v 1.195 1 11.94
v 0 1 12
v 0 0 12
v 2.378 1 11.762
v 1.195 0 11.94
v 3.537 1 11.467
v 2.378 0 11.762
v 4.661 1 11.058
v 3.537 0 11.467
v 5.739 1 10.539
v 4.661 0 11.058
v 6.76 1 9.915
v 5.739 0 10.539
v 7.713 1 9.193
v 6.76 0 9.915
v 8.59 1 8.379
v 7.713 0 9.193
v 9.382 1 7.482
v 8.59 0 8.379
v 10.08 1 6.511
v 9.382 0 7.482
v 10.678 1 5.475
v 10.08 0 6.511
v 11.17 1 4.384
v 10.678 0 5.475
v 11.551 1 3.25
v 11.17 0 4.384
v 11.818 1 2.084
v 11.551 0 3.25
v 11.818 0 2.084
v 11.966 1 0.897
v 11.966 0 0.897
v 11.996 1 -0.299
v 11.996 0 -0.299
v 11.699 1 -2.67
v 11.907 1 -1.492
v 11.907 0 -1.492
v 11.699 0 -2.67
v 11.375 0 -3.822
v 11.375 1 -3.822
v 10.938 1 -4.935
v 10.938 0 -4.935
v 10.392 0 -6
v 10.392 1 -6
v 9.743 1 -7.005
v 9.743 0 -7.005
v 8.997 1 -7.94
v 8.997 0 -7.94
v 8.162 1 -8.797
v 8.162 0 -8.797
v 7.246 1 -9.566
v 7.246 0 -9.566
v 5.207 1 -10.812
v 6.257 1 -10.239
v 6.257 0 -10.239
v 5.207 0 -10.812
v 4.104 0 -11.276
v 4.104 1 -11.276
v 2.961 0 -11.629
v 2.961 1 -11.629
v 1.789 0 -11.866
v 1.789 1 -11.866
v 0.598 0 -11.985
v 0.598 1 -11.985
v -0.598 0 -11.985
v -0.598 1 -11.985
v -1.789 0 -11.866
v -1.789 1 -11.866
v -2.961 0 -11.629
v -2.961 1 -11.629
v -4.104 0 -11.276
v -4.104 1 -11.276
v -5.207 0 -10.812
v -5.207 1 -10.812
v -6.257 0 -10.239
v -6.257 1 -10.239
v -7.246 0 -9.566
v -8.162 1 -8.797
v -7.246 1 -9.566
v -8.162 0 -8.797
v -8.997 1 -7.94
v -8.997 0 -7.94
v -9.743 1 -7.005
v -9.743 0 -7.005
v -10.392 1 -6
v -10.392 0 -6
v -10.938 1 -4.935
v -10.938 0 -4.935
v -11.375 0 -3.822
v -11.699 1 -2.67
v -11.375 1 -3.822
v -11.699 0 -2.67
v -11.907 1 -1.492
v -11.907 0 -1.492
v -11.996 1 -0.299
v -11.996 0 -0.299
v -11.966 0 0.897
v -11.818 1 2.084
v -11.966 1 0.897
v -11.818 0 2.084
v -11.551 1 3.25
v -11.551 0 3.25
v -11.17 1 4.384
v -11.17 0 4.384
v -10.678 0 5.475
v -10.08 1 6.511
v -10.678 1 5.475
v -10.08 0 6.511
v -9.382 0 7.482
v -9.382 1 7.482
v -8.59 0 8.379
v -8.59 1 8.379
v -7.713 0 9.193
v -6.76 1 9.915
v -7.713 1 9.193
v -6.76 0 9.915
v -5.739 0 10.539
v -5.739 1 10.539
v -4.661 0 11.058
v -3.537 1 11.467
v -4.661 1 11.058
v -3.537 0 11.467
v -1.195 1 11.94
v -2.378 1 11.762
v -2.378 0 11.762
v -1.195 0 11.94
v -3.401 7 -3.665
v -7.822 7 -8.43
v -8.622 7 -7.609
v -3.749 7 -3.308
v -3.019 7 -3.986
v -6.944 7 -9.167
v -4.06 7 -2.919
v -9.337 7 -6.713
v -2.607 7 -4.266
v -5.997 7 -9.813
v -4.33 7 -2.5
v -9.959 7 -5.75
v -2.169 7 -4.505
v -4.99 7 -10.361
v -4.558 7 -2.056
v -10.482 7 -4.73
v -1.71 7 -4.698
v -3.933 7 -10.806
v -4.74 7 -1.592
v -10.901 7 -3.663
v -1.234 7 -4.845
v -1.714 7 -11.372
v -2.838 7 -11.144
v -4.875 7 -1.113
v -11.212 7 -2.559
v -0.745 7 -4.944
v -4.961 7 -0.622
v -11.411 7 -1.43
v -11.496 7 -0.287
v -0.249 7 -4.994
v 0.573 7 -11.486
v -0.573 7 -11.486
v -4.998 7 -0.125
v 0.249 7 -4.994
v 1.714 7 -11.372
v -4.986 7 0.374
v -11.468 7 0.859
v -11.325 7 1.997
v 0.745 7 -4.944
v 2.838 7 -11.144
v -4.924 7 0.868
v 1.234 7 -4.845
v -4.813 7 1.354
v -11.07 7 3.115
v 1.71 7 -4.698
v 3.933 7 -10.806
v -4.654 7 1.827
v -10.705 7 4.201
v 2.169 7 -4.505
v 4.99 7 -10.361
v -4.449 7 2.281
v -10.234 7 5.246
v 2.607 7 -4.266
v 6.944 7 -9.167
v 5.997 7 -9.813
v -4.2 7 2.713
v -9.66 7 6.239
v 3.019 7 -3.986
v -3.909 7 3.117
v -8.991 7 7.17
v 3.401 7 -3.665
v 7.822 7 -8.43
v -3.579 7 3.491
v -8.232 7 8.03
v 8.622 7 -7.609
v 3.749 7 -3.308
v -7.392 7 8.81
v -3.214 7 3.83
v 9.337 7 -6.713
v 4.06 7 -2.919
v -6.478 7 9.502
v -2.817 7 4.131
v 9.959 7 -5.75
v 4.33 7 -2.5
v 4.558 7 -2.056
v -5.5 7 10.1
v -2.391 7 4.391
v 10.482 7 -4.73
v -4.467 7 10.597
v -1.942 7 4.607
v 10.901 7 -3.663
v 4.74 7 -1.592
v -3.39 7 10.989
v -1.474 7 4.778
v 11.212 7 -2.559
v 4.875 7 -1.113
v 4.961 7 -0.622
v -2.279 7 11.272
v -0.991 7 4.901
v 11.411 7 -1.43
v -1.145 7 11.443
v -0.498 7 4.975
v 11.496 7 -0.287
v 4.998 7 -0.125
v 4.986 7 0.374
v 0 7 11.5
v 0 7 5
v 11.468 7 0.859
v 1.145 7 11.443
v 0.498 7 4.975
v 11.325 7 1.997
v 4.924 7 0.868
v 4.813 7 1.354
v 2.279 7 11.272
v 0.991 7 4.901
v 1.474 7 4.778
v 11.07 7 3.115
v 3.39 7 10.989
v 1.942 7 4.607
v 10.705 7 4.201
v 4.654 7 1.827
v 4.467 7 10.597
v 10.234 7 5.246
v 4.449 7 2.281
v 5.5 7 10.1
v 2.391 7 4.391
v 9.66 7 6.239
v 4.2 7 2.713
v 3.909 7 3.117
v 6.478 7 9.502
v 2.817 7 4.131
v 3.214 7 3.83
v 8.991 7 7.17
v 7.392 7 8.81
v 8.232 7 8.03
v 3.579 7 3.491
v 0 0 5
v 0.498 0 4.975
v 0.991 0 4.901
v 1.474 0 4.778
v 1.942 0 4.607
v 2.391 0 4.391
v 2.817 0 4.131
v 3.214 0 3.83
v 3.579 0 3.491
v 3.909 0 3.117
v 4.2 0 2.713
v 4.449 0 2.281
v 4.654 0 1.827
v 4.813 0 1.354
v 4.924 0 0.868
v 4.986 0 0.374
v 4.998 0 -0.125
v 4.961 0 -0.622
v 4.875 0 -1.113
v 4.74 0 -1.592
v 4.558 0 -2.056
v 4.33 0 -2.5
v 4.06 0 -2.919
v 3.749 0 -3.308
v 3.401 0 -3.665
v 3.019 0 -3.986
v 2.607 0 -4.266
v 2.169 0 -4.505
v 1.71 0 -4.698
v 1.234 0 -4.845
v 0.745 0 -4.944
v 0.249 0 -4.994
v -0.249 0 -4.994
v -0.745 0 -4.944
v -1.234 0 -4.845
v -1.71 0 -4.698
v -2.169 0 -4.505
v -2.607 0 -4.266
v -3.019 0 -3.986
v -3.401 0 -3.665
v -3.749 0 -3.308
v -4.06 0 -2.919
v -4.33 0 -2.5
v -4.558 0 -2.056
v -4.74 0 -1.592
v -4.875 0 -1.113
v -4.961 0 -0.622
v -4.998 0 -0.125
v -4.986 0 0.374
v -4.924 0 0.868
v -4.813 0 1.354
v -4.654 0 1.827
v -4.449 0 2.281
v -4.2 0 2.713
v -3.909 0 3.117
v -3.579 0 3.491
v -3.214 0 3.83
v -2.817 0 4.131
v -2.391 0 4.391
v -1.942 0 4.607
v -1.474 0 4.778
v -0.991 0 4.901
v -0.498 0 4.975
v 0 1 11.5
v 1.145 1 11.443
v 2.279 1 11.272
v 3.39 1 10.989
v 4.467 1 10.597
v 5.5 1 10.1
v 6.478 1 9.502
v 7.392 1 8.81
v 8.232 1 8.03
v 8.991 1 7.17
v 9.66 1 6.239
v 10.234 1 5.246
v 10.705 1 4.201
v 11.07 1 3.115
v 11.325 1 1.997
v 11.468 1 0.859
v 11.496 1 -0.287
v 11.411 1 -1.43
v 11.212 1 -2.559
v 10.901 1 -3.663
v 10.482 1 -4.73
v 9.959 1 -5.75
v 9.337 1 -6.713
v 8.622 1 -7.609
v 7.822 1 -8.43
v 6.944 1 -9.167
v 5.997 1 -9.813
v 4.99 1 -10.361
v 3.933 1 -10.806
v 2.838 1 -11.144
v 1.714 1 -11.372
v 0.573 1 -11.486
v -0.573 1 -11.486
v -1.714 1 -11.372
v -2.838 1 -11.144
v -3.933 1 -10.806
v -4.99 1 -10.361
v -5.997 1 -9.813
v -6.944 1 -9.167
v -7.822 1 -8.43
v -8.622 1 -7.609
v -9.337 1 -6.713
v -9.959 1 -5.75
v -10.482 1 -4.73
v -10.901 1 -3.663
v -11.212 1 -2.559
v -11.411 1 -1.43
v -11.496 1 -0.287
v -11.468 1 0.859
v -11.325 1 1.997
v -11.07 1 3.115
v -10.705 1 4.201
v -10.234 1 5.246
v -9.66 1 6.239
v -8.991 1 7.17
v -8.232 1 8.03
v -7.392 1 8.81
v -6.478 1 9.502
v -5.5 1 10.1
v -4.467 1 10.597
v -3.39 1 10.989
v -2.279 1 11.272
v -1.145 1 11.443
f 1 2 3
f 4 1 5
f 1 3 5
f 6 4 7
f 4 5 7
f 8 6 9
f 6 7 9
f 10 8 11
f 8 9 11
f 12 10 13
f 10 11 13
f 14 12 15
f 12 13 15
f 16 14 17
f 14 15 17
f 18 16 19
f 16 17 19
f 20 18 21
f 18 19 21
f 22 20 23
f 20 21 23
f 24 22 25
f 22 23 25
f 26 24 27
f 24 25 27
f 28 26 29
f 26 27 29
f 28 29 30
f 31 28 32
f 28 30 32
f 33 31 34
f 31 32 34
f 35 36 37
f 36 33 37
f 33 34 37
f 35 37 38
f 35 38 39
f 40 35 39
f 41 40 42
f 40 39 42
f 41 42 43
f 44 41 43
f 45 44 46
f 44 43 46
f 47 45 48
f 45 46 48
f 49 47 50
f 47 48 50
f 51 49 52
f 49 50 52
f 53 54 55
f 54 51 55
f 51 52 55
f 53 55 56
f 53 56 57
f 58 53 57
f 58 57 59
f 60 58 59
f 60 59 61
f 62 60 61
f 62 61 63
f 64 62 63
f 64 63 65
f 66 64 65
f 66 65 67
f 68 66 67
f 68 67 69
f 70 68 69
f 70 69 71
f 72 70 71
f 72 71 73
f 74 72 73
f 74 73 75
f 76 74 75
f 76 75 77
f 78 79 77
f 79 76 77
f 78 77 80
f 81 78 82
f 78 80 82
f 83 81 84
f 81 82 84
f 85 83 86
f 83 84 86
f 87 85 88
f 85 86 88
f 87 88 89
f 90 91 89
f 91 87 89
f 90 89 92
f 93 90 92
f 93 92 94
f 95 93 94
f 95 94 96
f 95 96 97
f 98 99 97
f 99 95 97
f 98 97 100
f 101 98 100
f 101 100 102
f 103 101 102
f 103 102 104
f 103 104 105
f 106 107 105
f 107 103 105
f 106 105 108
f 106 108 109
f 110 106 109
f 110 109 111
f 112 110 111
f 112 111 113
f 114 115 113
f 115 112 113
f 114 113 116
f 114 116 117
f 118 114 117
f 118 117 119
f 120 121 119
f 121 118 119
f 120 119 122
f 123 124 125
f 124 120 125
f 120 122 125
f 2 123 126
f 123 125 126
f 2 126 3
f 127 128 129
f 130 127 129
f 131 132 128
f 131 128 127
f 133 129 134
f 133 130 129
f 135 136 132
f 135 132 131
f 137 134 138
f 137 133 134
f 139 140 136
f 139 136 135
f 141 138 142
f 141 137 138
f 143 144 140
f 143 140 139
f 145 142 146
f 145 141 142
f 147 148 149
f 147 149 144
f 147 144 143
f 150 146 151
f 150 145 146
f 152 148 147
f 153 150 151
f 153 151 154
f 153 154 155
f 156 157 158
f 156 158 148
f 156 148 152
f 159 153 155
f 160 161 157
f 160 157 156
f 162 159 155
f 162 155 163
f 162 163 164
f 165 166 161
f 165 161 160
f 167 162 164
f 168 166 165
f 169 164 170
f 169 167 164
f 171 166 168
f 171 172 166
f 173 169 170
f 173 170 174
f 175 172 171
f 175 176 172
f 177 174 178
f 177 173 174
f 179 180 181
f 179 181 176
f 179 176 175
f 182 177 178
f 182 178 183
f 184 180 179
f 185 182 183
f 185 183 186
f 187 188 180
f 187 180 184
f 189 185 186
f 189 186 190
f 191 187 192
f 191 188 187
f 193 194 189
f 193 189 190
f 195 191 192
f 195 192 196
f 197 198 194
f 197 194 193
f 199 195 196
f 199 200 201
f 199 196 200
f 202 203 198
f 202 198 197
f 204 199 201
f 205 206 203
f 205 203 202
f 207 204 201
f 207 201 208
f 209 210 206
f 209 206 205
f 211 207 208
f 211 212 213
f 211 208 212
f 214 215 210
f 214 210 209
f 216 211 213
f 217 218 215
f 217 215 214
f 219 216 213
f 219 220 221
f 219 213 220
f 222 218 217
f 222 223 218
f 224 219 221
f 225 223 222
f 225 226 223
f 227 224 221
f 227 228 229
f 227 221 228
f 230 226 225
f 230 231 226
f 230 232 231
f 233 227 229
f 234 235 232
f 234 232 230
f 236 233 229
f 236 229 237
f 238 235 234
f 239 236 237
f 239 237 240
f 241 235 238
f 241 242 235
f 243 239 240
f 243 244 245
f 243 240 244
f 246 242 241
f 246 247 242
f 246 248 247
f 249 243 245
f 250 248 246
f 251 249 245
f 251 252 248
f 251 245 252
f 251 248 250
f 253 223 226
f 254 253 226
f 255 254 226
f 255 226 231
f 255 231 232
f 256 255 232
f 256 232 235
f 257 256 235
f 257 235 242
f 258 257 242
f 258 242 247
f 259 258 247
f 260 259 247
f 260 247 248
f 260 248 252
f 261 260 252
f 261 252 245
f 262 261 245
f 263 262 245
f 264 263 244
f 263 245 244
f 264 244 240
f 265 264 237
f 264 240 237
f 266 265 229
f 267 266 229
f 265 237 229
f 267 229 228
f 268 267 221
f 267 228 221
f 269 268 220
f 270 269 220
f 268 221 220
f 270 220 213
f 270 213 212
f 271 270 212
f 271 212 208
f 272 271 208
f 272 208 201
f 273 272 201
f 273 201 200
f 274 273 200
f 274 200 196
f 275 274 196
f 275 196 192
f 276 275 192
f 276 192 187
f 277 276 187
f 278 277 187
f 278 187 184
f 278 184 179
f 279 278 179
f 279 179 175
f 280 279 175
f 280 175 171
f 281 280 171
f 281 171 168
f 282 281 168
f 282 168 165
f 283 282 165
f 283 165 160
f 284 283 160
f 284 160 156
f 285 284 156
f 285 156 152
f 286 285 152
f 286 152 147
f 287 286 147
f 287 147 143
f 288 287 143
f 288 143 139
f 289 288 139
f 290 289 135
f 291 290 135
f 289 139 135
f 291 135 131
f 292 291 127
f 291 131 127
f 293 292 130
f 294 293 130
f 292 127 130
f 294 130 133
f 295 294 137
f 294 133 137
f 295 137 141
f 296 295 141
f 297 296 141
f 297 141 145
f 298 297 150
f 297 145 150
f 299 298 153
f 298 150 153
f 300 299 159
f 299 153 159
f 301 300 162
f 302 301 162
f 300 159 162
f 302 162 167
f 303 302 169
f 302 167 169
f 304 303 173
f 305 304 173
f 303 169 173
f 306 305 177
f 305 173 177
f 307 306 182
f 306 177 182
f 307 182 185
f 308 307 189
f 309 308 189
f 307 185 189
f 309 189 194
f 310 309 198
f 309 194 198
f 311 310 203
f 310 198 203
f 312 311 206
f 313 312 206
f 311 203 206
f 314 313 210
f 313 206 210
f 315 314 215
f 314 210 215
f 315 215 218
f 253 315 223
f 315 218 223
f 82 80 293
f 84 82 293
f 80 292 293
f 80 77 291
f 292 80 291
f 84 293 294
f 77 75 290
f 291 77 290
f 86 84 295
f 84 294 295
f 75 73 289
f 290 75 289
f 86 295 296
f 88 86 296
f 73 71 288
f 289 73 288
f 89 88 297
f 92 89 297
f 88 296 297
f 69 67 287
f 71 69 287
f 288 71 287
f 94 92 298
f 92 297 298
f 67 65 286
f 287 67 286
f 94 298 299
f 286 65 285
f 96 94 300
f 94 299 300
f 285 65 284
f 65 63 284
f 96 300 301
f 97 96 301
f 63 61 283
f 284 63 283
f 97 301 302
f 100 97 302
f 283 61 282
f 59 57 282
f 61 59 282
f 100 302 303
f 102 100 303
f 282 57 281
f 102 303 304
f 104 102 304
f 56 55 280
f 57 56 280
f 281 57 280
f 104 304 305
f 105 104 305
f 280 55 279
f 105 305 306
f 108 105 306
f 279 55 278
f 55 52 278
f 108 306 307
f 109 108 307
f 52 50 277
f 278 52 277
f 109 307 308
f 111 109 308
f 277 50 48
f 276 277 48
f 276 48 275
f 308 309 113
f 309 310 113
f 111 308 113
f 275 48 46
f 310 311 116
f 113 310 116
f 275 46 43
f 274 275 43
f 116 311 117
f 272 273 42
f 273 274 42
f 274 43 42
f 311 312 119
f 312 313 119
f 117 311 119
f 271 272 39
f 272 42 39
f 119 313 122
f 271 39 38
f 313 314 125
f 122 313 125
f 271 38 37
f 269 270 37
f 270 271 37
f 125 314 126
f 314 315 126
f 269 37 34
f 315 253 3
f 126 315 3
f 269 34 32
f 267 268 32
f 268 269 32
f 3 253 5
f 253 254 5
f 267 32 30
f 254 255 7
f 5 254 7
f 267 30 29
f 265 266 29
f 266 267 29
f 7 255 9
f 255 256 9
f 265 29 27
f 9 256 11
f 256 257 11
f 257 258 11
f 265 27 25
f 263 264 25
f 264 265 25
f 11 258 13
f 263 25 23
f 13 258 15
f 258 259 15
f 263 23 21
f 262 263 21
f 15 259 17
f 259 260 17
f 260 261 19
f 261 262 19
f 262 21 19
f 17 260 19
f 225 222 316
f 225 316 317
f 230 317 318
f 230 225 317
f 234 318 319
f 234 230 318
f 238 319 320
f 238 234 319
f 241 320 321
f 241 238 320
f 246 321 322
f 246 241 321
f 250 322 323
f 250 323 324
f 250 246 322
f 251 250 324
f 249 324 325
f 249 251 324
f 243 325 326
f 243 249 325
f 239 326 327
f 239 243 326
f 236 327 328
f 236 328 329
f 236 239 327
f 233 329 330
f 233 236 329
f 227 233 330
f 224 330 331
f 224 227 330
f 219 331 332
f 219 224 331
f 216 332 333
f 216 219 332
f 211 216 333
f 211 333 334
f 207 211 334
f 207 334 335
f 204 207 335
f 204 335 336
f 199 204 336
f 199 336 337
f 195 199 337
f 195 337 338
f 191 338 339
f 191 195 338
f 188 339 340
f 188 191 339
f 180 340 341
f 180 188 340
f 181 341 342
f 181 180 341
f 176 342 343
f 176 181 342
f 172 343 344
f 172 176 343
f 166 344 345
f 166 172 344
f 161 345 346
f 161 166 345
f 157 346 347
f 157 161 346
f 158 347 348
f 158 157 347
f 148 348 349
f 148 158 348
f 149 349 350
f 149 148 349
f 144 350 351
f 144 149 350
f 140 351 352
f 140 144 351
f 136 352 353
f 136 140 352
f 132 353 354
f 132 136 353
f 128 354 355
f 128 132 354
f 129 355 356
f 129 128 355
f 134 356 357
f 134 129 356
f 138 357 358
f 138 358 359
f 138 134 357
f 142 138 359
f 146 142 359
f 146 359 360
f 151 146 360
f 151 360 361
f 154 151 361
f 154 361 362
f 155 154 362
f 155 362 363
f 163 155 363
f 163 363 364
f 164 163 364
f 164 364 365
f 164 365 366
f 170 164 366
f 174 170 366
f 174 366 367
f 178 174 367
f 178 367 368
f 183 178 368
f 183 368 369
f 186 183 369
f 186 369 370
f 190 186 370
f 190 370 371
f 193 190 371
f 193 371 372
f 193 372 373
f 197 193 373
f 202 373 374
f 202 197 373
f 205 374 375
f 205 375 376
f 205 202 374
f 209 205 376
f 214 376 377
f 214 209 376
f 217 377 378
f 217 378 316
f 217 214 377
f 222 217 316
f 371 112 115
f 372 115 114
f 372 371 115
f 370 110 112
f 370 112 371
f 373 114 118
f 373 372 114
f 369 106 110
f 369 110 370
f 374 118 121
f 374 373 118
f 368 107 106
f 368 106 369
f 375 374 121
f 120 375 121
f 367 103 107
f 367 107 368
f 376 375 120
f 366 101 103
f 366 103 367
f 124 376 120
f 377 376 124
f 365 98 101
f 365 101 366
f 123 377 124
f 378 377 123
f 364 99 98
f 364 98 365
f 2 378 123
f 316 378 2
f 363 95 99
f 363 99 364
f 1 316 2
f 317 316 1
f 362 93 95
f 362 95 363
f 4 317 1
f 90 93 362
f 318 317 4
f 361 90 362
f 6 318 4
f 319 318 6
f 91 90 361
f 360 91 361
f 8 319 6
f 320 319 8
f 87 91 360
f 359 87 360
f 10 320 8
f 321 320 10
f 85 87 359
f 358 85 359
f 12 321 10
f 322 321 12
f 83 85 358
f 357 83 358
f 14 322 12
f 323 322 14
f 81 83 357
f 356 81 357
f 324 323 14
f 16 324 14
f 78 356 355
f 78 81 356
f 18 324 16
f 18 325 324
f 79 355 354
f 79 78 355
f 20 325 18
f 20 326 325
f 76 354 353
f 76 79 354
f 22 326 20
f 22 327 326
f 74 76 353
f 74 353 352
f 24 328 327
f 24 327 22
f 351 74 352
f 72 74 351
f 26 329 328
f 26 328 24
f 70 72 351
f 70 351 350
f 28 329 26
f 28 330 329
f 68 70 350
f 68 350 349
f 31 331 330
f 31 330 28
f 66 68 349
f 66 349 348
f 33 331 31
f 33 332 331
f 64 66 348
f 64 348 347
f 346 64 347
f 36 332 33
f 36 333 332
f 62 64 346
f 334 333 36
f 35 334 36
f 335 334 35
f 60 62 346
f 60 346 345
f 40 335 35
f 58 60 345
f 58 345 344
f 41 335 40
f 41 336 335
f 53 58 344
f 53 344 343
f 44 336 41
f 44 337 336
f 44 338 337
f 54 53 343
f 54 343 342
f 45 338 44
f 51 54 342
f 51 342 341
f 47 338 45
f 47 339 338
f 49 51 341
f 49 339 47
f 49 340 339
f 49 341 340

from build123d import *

# Parameters (mm, degrees)
SKETCH1_R           = 12
BOSS_EXTRUDE1_DEPTH = 7
SKETCH2_OUTSIDE_W   = 32.932
SKETCH2_OUTSIDE_H   = 32.932
SKETCH2_OUTSIDE_R   = 11.5
CUT_EXTRUDE3_DEPTH  = 6
CUT_EXTRUDE4_REACH  = 20.358
SKETCH3_R           = 5


with BuildPart() as part:
    # Sketch1 → Boss-Extrude1 (new body)
    with BuildSketch(Plane(origin=(0, 0, 0), x_dir=(1, 0, 0), z_dir=(0, 1, 0))):
        with Locations(Location((0, 0, 0), (0, 0, 270))):
            Circle(SKETCH1_R)
    extrude(amount=BOSS_EXTRUDE1_DEPTH)

    # Sketch2 outside → Cut-Extrude3 (cut)
    with BuildSketch(Plane(origin=(0, 7, 0), x_dir=(1, 0, 0), z_dir=(0, 1, 0))):
        Rectangle(SKETCH2_OUTSIDE_W, SKETCH2_OUTSIDE_H)
        with Locations(Location((0, 0, 0), (0, 0, 270))):
            Circle(SKETCH2_OUTSIDE_R, mode=Mode.SUBTRACT)
    extrude(amount=-CUT_EXTRUDE3_DEPTH, mode=Mode.SUBTRACT)

    # Sketch3 → Cut-Extrude4 (cut, up to next)
    with BuildSketch(Plane(origin=(0, 7, 0), x_dir=(1, 0, 0), z_dir=(0, 1, 0)), mode=Mode.PRIVATE) as cut_extrude4_sk1:
        with Locations(Location((0, 0, 0), (0, 0, 270))):
            Circle(SKETCH3_R)
    cut_extrude4_tool1 = extrude(cut_extrude4_sk1.sketch, amount=-CUT_EXTRUDE4_REACH, mode=Mode.PRIVATE) & part.part
    add(cut_extrude4_tool1.solids().sort_by_distance((0, 7, 0))[0], mode=Mode.SUBTRACT)


solid = part.part
